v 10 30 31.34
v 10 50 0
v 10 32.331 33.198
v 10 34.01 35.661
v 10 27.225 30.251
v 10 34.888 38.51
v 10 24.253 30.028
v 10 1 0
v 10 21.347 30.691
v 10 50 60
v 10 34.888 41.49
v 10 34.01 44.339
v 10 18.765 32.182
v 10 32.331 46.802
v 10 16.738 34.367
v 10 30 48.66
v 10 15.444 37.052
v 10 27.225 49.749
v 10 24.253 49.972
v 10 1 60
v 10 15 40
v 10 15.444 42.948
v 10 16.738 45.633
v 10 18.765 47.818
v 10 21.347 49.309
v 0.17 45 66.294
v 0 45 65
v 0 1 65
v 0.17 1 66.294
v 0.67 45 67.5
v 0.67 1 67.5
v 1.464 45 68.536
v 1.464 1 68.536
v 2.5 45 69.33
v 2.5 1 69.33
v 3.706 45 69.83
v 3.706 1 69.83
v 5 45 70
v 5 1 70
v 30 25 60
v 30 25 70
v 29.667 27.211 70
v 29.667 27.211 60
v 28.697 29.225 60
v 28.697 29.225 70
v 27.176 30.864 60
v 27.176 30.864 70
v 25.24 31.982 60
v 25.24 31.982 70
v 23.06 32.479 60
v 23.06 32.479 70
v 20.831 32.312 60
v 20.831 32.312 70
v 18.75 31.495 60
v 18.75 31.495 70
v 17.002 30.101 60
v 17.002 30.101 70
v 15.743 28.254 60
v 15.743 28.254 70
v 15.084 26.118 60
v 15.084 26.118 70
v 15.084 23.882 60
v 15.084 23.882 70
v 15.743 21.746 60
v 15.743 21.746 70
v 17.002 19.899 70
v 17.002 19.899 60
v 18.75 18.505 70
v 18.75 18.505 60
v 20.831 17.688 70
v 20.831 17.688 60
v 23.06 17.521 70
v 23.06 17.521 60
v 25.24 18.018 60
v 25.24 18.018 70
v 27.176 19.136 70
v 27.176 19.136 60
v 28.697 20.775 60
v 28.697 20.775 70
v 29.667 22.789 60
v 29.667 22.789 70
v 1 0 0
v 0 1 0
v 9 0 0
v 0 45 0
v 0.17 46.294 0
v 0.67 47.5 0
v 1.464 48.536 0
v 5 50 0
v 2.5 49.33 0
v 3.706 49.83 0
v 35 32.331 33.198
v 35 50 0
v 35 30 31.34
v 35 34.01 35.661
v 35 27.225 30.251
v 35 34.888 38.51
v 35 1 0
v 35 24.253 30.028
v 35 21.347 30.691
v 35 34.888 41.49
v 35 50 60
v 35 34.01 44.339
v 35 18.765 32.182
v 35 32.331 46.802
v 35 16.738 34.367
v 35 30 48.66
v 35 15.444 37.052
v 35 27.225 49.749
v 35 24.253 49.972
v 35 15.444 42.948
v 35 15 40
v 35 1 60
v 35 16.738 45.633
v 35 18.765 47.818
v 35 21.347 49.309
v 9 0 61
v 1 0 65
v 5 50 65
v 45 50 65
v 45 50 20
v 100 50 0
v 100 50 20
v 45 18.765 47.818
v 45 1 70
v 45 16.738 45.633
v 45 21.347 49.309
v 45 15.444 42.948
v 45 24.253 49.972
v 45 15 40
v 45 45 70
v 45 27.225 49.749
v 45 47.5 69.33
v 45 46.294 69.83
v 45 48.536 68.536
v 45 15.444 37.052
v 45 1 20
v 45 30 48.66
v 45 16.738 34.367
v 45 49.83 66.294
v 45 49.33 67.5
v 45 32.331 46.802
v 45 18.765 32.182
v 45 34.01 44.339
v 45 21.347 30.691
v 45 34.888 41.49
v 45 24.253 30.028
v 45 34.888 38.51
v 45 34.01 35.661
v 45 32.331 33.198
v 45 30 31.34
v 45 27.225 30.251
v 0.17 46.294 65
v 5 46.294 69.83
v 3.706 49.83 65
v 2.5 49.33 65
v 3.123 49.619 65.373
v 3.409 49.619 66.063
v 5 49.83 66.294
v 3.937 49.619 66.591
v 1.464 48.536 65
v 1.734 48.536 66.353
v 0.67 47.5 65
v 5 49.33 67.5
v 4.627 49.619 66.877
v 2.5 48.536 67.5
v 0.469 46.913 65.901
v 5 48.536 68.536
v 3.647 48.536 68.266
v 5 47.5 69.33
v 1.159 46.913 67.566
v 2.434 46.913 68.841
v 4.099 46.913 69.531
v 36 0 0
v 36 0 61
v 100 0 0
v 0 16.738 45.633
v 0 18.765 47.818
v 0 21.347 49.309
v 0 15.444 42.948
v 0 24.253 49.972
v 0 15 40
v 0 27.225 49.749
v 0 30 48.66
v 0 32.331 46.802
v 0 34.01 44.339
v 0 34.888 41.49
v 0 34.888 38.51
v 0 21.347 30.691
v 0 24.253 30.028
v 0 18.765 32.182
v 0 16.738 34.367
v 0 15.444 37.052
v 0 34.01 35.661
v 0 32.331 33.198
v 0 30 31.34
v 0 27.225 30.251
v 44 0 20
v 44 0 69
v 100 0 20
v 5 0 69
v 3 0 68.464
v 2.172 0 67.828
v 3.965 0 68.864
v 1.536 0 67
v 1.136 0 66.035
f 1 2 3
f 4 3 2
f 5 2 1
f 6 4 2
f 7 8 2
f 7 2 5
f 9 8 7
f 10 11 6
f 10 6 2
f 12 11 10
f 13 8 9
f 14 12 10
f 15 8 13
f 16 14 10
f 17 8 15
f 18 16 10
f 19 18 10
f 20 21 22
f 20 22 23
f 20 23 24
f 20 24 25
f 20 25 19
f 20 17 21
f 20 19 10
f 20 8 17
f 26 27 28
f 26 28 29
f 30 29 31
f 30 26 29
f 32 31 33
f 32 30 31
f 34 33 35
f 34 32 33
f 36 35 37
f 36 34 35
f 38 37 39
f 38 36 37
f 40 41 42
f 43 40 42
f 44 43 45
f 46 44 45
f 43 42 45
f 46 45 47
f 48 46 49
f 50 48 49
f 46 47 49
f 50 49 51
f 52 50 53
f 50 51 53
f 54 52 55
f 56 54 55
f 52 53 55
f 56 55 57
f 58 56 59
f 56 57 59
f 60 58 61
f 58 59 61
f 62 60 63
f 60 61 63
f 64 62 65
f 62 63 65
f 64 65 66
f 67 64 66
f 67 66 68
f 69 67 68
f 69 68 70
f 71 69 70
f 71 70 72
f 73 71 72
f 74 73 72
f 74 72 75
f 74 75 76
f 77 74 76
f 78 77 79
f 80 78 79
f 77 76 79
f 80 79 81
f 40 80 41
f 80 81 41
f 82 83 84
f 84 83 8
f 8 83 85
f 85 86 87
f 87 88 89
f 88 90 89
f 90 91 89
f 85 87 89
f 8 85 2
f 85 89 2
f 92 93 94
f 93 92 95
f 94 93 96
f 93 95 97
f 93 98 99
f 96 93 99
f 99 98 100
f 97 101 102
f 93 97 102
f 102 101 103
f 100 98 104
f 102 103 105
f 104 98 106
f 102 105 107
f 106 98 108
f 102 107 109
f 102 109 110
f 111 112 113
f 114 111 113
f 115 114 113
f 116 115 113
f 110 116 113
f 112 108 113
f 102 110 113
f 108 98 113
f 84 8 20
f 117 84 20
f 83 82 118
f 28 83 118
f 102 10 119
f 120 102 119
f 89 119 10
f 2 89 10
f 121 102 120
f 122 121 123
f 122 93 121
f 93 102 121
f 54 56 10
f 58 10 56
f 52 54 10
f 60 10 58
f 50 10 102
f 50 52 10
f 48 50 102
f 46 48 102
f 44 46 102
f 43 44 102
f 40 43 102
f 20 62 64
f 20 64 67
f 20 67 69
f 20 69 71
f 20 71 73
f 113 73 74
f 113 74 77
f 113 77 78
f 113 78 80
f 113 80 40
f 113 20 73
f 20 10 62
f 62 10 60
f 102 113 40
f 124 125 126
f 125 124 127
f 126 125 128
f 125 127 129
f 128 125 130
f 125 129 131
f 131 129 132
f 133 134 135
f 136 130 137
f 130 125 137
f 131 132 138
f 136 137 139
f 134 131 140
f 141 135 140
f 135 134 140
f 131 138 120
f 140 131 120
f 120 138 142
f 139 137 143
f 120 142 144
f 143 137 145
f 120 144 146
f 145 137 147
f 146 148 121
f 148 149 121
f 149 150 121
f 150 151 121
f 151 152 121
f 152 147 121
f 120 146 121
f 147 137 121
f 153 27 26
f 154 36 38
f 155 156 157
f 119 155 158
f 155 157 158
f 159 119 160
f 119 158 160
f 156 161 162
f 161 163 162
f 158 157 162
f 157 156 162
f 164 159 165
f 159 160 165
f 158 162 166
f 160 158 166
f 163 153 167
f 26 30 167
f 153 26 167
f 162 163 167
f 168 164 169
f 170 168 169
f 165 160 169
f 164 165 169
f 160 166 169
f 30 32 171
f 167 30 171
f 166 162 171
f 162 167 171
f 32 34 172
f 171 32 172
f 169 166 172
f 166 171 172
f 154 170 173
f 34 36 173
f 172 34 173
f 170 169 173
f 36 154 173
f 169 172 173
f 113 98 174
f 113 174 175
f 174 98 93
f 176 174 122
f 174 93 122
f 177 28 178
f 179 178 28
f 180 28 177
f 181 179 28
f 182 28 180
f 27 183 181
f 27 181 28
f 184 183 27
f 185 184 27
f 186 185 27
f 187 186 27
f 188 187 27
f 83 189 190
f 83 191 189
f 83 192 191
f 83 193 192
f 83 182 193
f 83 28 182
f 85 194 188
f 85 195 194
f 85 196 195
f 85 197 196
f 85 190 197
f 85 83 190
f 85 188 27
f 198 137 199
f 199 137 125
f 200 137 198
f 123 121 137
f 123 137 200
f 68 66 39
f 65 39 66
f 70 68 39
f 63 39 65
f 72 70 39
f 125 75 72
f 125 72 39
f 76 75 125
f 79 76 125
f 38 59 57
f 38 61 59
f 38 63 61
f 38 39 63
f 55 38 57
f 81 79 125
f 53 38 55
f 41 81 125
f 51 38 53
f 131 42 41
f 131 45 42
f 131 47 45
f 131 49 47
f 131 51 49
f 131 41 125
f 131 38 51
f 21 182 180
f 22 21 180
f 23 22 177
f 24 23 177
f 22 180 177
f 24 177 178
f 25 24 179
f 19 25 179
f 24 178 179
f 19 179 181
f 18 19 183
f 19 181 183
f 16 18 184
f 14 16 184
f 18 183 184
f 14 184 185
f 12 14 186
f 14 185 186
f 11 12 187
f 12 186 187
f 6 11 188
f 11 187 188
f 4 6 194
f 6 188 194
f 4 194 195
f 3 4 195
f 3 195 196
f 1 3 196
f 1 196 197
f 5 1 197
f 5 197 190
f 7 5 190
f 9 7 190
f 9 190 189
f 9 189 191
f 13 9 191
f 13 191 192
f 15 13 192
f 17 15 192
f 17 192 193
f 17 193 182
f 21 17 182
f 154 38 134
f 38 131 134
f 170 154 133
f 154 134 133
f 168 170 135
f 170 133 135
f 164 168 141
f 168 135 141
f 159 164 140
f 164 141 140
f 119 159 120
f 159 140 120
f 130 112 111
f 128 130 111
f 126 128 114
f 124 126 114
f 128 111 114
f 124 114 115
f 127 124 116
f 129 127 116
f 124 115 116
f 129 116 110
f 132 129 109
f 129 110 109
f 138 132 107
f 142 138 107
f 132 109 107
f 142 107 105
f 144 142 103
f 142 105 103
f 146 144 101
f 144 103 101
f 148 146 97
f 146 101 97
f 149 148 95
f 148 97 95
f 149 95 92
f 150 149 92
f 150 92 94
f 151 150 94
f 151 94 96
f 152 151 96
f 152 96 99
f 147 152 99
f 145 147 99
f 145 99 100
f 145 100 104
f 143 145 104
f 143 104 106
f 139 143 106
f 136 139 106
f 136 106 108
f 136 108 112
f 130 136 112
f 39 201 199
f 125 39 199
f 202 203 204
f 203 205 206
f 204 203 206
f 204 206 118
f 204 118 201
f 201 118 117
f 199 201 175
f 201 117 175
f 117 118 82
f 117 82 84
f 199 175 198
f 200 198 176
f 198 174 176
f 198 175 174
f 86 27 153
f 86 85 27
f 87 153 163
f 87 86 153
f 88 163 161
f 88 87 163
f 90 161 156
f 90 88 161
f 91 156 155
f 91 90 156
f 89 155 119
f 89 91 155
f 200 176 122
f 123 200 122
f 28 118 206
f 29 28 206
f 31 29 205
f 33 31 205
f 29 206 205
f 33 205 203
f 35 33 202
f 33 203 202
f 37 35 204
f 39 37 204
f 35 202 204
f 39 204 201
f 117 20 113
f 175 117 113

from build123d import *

# Parameters (mm, degrees)
F0_W     = 100
F0_H     = 50
F1_DEPTH = 20
F2_W     = 45
F2_H     = 50
F3_DEPTH = 50
F4_W     = 25
F4_H     = 60
F5_DEPTH = 50
F6_R     = 10
F7_DEPTH = 45
F8_R     = 7.5
F9_DEPTH = 10
F10_R    = 5
F11_SIZE = 1


with BuildPart() as f1:
    # F0 (on Top) → F1 (new body)
    with BuildSketch(Plane.XY):
        with Locations((50, 25)):
            Rectangle(F0_W, F0_H)
    extrude(amount=F1_DEPTH)

    # F2 (on face) → F3 (join)
    with BuildSketch(Plane.XY.offset(20)):
        with Locations((22.5, 25)):
            Rectangle(F2_W, F2_H)
    extrude(amount=F3_DEPTH)

    # F4 (on face) → F5 (cut, through all)
    with BuildSketch(Plane.XZ):
        with Locations((22.5, 30)):
            Rectangle(F4_W, F4_H)
    extrude(amount=-F5_DEPTH, mode=Mode.SUBTRACT)

    # F6 (on face) → F7 (cut, through all)
    with BuildSketch(Plane(origin=(0, 0, 0), x_dir=(0, -1, 0), z_dir=(-1, 0, 0))):
        with Locations((-25, 40)):
            Circle(F6_R)
    extrude(amount=-F7_DEPTH, mode=Mode.SUBTRACT)

    # F8 (on face) → F9 (cut, through all)
    with BuildSketch(Plane.XY.offset(70)):
        with Locations((22.5, 25)):
            Circle(F8_R)
    extrude(amount=-F9_DEPTH, mode=Mode.SUBTRACT)

    # F10
    f10_edges = [f1.edges().sort_by_distance(p)[0] for p in [
        (0, 25, 70),
        (0, 50, 35),
        (22.5, 50, 70),
    ]]
    fillet(f10_edges, radius=F10_R)

    # F11
    f11_edges = [f1.edges().sort_by_distance(p)[0] for p in [
        (0, 0, 32.5),
        (25, 0, 70),
        (45, 0, 45),
        (35, 0, 30),
        (22.5, 0, 60),
        (10, 0, 30),
    ]]
    chamfer(f11_edges, length=F11_SIZE)


solid = f1.part
